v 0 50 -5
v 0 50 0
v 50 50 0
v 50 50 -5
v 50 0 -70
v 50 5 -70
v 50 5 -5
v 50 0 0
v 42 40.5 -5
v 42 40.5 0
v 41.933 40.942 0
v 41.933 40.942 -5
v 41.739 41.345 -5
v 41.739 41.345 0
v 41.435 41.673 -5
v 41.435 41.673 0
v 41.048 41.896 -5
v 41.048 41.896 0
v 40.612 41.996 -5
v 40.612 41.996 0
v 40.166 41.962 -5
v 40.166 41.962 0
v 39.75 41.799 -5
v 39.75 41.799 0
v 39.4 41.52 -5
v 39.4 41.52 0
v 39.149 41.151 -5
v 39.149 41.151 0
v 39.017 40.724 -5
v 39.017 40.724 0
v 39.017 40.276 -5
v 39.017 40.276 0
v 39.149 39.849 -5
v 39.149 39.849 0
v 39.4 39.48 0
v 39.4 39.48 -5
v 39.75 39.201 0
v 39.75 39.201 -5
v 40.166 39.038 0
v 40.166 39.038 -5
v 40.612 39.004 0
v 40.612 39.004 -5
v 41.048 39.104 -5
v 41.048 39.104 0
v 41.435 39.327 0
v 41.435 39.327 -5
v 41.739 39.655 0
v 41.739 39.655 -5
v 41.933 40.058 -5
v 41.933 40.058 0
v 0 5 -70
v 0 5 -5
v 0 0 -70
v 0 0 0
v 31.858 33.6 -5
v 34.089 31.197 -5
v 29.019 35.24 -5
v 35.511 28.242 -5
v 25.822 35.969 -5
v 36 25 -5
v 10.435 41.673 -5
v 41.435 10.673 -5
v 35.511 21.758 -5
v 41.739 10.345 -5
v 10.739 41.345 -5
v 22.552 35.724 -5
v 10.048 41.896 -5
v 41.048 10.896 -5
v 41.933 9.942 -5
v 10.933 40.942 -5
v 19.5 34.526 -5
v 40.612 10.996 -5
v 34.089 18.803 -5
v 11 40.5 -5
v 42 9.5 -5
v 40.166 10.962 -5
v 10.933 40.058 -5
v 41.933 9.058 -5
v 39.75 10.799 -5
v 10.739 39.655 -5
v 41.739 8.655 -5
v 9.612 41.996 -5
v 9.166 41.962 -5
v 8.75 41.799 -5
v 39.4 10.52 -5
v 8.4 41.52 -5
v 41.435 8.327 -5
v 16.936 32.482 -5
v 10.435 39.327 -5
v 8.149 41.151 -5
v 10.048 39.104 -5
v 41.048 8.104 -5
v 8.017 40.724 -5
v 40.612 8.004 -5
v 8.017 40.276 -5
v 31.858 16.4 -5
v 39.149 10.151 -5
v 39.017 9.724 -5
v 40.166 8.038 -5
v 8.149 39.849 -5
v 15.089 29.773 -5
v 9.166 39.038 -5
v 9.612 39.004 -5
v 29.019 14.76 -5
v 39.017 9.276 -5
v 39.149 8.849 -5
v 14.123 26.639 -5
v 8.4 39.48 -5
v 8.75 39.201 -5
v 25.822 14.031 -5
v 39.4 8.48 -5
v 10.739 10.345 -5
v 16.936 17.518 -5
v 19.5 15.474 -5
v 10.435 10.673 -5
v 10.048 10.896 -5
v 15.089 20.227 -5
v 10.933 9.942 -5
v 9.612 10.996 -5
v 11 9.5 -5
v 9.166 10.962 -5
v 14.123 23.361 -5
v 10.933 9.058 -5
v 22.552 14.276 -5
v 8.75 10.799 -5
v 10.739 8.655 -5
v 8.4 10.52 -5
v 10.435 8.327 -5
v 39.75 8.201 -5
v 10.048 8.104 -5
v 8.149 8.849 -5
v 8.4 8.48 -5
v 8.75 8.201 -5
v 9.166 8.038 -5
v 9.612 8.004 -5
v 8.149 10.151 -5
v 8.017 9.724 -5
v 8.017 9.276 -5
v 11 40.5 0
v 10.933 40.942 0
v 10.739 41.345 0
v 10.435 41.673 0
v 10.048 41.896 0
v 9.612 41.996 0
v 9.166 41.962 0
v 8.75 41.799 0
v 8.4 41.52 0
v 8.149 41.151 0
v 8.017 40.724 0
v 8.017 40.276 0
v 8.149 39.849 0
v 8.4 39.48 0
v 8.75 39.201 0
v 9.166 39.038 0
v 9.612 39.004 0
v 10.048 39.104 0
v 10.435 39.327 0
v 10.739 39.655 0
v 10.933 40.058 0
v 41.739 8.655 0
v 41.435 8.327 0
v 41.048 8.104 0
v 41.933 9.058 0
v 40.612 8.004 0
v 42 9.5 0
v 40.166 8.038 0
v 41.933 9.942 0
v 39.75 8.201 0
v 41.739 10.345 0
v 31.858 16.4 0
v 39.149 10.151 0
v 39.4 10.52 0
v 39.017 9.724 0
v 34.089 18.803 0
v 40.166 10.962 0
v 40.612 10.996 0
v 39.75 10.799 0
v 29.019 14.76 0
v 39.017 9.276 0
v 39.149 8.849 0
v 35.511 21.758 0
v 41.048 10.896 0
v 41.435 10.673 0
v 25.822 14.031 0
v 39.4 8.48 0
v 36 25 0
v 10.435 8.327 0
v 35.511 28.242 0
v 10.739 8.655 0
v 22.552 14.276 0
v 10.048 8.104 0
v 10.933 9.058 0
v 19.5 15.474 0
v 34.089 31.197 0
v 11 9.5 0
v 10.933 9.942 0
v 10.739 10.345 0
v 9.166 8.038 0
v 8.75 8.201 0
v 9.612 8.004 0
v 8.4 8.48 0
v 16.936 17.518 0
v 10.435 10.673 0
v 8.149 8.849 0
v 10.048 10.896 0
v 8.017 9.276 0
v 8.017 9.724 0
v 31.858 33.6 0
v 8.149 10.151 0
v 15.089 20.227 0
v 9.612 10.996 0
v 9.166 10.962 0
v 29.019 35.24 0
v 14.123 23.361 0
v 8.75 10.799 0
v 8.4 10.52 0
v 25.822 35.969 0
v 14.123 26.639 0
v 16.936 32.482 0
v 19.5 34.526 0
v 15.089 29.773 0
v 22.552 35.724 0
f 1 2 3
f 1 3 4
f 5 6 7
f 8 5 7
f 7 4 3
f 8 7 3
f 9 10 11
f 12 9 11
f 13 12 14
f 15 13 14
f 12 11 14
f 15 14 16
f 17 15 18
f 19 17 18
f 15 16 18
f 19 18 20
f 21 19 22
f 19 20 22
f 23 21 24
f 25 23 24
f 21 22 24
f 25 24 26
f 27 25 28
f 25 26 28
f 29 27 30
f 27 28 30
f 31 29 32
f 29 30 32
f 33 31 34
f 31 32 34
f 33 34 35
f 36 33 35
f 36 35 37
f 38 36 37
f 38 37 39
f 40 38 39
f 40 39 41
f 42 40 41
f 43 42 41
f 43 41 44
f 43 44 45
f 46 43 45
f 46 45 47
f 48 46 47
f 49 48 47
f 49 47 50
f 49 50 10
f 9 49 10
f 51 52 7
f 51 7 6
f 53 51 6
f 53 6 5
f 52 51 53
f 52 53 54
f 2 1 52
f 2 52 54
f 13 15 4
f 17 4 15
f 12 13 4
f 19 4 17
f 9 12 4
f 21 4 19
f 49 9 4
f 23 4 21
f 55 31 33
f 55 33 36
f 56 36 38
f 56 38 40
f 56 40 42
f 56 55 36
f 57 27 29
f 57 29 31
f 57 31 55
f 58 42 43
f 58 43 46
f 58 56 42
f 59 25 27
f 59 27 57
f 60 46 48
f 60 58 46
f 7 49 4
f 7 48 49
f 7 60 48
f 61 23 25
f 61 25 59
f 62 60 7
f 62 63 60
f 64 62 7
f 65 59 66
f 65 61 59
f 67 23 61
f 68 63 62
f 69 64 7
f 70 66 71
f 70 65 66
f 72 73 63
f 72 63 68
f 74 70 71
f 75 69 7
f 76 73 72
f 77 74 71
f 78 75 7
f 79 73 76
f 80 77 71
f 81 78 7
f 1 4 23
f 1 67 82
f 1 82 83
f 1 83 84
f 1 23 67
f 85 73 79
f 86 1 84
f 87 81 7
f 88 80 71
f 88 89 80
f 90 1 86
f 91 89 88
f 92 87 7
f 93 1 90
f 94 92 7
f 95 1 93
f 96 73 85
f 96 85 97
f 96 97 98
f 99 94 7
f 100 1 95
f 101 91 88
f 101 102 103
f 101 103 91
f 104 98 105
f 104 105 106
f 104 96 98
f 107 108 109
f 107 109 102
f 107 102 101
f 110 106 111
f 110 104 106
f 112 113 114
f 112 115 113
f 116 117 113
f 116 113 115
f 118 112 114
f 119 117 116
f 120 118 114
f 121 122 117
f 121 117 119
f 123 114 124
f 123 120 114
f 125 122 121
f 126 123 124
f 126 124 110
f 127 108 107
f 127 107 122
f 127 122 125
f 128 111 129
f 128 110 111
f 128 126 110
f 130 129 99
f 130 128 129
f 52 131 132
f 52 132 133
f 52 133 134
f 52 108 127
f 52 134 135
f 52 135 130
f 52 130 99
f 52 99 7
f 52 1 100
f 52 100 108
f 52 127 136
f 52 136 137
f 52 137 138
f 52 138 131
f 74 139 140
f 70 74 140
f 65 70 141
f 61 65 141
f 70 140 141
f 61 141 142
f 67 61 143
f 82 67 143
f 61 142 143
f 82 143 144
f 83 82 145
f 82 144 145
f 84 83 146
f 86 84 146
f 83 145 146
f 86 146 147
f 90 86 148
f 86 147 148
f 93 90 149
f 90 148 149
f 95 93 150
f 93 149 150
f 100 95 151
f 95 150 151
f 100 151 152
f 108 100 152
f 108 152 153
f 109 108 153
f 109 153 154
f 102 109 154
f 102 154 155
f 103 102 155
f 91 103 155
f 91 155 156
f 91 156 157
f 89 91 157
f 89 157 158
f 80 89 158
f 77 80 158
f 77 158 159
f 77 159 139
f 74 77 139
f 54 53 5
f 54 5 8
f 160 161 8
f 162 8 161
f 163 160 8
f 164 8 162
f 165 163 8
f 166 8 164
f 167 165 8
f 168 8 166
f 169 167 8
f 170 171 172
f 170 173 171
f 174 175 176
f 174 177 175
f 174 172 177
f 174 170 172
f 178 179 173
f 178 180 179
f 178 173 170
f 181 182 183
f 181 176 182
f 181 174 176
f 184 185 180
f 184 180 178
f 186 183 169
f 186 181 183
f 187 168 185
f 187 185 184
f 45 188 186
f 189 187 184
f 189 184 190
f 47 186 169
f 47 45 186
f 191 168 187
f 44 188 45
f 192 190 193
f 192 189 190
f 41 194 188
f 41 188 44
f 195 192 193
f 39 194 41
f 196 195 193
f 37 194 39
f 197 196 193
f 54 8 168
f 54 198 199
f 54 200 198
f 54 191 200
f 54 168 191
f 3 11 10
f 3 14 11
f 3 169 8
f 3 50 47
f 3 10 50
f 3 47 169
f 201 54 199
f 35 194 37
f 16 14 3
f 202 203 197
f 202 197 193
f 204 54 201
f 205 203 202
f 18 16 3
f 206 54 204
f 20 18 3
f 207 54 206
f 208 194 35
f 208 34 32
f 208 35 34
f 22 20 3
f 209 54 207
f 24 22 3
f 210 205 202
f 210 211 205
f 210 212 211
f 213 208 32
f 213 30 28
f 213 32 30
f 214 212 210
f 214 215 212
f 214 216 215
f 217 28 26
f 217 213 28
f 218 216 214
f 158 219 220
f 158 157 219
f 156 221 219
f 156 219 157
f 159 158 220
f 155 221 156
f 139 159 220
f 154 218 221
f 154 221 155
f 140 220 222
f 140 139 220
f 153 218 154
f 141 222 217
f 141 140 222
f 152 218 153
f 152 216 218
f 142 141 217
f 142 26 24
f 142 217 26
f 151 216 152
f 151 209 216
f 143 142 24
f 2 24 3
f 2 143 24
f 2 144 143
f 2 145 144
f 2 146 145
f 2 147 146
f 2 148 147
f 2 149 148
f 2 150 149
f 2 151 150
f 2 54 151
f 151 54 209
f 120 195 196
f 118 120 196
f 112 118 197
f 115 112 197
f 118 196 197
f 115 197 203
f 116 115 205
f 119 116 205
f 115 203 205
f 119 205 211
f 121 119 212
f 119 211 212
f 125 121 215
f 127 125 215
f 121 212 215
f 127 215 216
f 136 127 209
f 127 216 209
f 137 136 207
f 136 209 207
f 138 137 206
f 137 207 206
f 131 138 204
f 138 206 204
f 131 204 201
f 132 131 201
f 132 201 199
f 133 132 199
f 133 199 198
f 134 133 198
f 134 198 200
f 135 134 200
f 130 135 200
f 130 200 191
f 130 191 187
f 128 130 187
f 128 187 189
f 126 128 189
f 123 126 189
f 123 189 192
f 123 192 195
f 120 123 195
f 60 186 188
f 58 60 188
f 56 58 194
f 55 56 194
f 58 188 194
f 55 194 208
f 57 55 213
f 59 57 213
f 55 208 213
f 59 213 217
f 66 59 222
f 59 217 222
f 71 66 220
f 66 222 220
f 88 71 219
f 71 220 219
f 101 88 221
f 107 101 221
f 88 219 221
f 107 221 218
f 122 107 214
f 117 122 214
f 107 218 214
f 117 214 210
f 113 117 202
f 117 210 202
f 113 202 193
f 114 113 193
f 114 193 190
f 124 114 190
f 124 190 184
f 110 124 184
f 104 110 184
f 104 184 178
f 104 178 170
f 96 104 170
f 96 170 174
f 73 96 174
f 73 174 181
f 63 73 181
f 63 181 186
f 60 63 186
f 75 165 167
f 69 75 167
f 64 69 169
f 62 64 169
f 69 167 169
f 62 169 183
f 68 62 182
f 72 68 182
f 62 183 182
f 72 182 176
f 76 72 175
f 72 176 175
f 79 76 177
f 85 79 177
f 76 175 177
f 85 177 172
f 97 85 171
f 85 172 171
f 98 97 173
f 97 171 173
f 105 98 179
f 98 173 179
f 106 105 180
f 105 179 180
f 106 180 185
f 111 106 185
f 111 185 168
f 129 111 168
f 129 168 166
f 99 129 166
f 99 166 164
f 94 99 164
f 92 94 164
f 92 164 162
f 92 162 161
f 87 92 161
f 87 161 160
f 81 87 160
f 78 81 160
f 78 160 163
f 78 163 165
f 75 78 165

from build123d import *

# Parameters (mm, degrees)
BOSS_EXTRUDE1_DEPTH = 50
CUT_EXTRUDE1_REACH  = 101.499
SKETCH3_R           = 11
SKETCH3_R_2         = 1.5


with BuildPart() as part:
    # Sketch1 → Boss-Extrude1 (new body)
    with BuildSketch(Plane(origin=(0, 0, 0), x_dir=(0, 0, -1), z_dir=(1, 0, 0))):
        Polygon((0, 0), (0, 50), (5, 50), (5, 5), (70, 5), (70, 0), align=None)
    extrude(amount=BOSS_EXTRUDE1_DEPTH)

    # Sketch3 → Cut-Extrude1 (cut, up to next)
    with BuildSketch(Plane.XY, mode=Mode.PRIVATE) as cut_extrude1_sk1:
        with Locations((25, 25)):
            Circle(SKETCH3_R)
    cut_extrude1_tool1 = extrude(cut_extrude1_sk1.sketch, amount=-CUT_EXTRUDE1_REACH, mode=Mode.PRIVATE) & part.part
    # Sketch3 → Cut-Extrude1 (cut, up to next)
    with BuildSketch(Plane.XY, mode=Mode.PRIVATE) as cut_extrude1_sk2:
        with Locations((40.5, 40.5)):
            Circle(SKETCH3_R_2)
    cut_extrude1_tool2 = extrude(cut_extrude1_sk2.sketch, amount=-CUT_EXTRUDE1_REACH, mode=Mode.PRIVATE) & part.part
    # Sketch3 → Cut-Extrude1 (cut, up to next)
    with BuildSketch(Plane.XY, mode=Mode.PRIVATE) as cut_extrude1_sk3:
        with Locations((9.5, 40.5)):
            Circle(SKETCH3_R_2)
    cut_extrude1_tool3 = extrude(cut_extrude1_sk3.sketch, amount=-CUT_EXTRUDE1_REACH, mode=Mode.PRIVATE) & part.part
    # Sketch3 → Cut-Extrude1 (cut, up to next)
    with BuildSketch(Plane.XY, mode=Mode.PRIVATE) as cut_extrude1_sk4:
        with Locations((9.5, 9.5)):
            Circle(SKETCH3_R_2)
    cut_extrude1_tool4 = extrude(cut_extrude1_sk4.sketch, amount=-CUT_EXTRUDE1_REACH, mode=Mode.PRIVATE) & part.part
    # Sketch3 → Cut-Extrude1 (cut, up to next)
    with BuildSketch(Plane.XY, mode=Mode.PRIVATE) as cut_extrude1_sk5:
        with Locations((40.5, 9.5)):
            Circle(SKETCH3_R_2)
    cut_extrude1_tool5 = extrude(cut_extrude1_sk5.sketch, amount=-CUT_EXTRUDE1_REACH, mode=Mode.PRIVATE) & part.part
    add(cut_extrude1_tool1.solids().sort_by_distance((25, 25, 0))[0], mode=Mode.SUBTRACT)
    add(cut_extrude1_tool2.solids().sort_by_distance((40.5, 40.5, 0))[0], mode=Mode.SUBTRACT)
    add(cut_extrude1_tool3.solids().sort_by_distance((9.5, 40.5, 0))[0], mode=Mode.SUBTRACT)
    add(cut_extrude1_tool4.solids().sort_by_distance((9.5, 9.5, 0))[0], mode=Mode.SUBTRACT)
    add(cut_extrude1_tool5.solids().sort_by_distance((40.5, 9.5, 0))[0], mode=Mode.SUBTRACT)


solid = part.part
